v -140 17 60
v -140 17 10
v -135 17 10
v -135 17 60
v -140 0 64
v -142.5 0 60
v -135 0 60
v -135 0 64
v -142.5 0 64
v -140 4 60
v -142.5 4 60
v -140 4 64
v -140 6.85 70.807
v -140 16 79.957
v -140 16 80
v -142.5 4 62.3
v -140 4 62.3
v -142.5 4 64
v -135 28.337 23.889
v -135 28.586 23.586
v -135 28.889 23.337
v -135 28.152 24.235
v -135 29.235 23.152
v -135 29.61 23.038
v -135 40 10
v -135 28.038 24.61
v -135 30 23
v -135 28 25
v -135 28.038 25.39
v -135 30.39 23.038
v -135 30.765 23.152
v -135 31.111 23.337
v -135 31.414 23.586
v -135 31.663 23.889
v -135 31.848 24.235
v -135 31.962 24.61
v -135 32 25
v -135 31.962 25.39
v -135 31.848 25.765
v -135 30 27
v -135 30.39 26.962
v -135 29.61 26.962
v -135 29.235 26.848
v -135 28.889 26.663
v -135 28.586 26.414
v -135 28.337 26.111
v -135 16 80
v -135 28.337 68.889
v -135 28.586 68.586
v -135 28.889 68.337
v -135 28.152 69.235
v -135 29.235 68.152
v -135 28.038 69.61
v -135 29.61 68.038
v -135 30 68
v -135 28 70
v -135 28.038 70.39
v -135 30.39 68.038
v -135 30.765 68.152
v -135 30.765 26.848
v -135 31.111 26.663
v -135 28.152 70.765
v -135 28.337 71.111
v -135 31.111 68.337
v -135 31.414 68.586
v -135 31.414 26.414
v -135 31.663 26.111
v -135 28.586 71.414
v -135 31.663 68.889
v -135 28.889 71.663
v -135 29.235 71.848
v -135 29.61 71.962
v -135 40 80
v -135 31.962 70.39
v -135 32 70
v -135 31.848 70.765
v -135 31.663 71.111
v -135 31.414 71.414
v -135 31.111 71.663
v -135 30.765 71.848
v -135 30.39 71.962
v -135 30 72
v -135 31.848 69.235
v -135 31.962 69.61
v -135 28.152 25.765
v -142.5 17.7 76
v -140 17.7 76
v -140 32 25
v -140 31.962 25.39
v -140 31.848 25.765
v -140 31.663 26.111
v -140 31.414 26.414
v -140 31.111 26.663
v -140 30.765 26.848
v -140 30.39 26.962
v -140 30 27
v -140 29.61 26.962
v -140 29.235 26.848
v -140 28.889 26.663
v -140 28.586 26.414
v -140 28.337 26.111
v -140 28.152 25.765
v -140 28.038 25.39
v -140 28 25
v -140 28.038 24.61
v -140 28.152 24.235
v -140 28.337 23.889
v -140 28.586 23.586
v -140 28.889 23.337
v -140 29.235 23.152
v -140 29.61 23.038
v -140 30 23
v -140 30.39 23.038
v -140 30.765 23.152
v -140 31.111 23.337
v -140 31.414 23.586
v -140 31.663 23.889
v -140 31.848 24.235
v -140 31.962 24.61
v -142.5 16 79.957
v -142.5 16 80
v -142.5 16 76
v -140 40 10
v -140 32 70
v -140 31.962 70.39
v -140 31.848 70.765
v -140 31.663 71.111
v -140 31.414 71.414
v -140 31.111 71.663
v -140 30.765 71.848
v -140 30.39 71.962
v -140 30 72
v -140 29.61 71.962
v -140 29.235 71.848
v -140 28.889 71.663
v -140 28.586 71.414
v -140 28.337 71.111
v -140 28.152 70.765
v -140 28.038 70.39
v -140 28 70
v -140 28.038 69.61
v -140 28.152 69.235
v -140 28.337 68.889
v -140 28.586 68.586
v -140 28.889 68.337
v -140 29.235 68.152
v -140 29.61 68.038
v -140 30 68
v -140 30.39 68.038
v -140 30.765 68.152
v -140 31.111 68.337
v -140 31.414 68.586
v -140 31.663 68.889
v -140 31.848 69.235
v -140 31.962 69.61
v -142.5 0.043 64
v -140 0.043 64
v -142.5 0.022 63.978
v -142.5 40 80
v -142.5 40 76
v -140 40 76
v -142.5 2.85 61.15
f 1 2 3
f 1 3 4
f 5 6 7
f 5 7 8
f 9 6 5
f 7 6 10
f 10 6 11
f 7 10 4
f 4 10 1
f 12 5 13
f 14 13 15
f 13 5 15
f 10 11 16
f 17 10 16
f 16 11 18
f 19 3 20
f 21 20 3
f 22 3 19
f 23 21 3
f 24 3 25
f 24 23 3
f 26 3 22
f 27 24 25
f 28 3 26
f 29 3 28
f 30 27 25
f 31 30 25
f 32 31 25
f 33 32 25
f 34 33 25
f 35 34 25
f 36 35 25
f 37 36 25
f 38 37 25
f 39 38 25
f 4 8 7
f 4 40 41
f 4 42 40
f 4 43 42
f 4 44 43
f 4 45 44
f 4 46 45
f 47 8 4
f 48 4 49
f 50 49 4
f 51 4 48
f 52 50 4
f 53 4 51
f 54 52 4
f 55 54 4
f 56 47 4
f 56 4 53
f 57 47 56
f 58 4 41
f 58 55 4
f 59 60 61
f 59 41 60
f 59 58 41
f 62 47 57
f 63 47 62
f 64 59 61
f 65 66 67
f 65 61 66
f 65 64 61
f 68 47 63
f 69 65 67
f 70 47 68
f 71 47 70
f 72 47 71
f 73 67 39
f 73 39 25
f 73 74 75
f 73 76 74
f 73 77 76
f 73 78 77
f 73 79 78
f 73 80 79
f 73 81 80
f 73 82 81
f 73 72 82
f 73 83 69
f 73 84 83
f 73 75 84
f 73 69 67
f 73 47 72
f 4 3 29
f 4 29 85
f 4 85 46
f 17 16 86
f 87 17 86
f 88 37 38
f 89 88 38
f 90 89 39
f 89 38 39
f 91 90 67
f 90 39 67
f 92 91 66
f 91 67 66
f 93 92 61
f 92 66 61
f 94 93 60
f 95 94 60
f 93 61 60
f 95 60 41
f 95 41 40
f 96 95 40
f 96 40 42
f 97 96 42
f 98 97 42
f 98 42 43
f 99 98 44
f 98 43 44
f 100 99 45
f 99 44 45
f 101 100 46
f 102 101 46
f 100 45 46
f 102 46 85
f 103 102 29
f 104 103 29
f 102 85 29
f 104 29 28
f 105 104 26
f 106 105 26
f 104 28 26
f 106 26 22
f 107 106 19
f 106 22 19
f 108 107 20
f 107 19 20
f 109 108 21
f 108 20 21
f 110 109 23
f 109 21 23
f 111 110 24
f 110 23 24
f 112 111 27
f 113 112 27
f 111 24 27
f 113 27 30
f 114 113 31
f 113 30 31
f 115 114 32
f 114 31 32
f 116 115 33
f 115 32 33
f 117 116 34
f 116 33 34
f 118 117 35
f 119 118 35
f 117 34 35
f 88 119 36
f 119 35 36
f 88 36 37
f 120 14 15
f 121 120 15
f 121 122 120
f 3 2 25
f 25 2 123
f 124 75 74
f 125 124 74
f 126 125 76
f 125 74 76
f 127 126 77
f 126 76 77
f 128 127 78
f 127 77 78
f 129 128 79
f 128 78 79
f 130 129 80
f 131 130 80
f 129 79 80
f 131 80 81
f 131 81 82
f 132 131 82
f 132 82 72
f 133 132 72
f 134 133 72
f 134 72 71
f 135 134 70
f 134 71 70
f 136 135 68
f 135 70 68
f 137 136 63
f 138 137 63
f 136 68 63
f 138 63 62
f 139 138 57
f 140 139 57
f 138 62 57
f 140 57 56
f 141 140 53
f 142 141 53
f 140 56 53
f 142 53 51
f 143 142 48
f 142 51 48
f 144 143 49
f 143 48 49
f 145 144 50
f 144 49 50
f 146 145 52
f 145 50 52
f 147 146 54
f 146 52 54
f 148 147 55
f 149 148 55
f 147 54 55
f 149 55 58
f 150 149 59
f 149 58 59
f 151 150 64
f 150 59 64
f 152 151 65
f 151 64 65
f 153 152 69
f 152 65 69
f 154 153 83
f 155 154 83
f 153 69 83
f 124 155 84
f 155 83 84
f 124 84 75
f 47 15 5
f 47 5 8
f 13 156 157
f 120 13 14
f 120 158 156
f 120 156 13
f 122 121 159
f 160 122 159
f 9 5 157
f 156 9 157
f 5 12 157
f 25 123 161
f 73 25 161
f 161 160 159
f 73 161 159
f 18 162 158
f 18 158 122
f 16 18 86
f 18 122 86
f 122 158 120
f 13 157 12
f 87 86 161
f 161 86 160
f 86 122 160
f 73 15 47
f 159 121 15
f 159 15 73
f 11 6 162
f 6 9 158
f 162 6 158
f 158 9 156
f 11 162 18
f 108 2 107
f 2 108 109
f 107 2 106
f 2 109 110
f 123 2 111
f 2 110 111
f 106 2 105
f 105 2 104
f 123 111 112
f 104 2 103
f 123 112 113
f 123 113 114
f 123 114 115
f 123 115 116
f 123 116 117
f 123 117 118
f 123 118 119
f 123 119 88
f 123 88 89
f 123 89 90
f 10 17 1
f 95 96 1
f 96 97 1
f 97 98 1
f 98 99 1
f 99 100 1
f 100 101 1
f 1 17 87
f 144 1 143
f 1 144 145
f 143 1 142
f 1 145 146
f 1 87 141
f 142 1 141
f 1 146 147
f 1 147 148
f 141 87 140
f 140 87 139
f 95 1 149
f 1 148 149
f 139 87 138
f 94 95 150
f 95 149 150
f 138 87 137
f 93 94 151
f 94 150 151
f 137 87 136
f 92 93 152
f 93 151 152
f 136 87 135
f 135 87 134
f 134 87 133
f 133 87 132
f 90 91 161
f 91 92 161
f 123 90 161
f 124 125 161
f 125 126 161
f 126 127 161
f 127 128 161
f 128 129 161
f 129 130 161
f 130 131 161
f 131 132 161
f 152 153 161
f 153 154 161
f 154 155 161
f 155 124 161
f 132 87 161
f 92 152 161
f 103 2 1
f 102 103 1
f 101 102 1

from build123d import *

# Parameters (mm, degrees)
CIRCLE003_R                                  = 2
EXTRUDE087_DEPTH                             = 5
CIRCLE004_R                                  = 2
EXTRUDE088_DEPTH                             = 5
RECTANGLE026_W                               = 23
RECTANGLE026_H                               = 20
EXTRUDE019_DEPTH                             = 5
CHAMFER006_SIZE                              = 16
RECTANGLE028_AS_DRAWN_W                      = 22.6
RECTANGLE028_AS_DRAWN_H                      = 4
EXTRUDE033_DEPTH                             = 2.5
EXTRUDE033_ONTO_RECTANGLE028_ROLL_ANGLE      = 89.999906
EXTRUDE033_ONTO_RECTANGLE028_PITCH_ANGLE     = -44.999767
EXTRUDE033_ONTO_RECTANGLE028_PLACEMENT_ANGLE = 89.999906
RECTANGLE029_W                               = 24
RECTANGLE029_H                               = 4
EXTRUDE034_DEPTH                             = 2.5
RECTANGLE030_W                               = 4
RECTANGLE030_H                               = 4
EXTRUDE035_DEPTH                             = 2.5
RECTANGLE027_W                               = 17
RECTANGLE027_H                               = 20
EXTRUDE020_DEPTH                             = 5
RECTANGLE025_W                               = 23
RECTANGLE025_H                               = 60
EXTRUDE018_DEPTH                             = 5


with BuildPart() as extrude087:
    # Circle003 → Extrude087 (new body)
    with BuildSketch(Plane(origin=(-135, 30, 25), x_dir=(0, 1, 0), z_dir=(1, 0, 0))):
        Circle(CIRCLE003_R)
    extrude(amount=-EXTRUDE087_DEPTH)


with BuildPart() as extrude088:
    # Circle004 → Extrude088 (new body)
    with BuildSketch(Plane(origin=(-135, 30, 70), x_dir=(0, 1, 0), z_dir=(1, 0, 0))):
        Circle(CIRCLE004_R)
    extrude(amount=-EXTRUDE088_DEPTH)


with BuildPart() as chamfer006:
    # Rectangle026 → Extrude019 (new body)
    with BuildSketch(Plane(origin=(0, 17, 70), x_dir=(0, 1, 0), z_dir=(1, 0, 0))):
        with Locations((11.5, 10)):
            Rectangle(RECTANGLE026_W, RECTANGLE026_H)
    extrude(amount=EXTRUDE019_DEPTH)


with BuildPart() as chamfer006_1:
    # Extrude019 placement: moved
    add(chamfer006.part.moved(Location((0, -17, 0))))

    # Chamfer006
    chamfer006_edges = [chamfer006_1.edges().sort_by_distance(p)[0] for p in [
        (2.5, 0, 90),
    ]]
    chamfer(chamfer006_edges, length=CHAMFER006_SIZE)


with BuildPart() as chamfer006_2:
    # Chamfer006 placement: moved
    add(chamfer006_1.part.moved(Location((-140, 0, 0))))


with BuildPart() as extrude033:
    # Rectangle028 as drawn → Extrude033 (new)
    with BuildSketch(Plane.XY):
        with Locations((11.3, 2)):
            Rectangle(RECTANGLE028_AS_DRAWN_W, RECTANGLE028_AS_DRAWN_H)
    extrude(amount=EXTRUDE033_DEPTH)


with BuildPart() as extrude033_1:
    # Extrude033 onto Rectangle028 roll: moved
    add(extrude033.part.rotate(Axis((0, 0, 0), (1, 0, 0)), EXTRUDE033_ONTO_RECTANGLE028_ROLL_ANGLE))


with BuildPart() as extrude033_2:
    # Extrude033 onto Rectangle028 pitch: moved
    add(extrude033_1.part.rotate(Axis((0, 0, 0), (0, 1, 0)), EXTRUDE033_ONTO_RECTANGLE028_PITCH_ANGLE))


with BuildPart() as extrude033_3:
    # Extrude033 onto Rectangle028 placement: moved
    add(extrude033_2.part.moved(Location((5, 2.85, 71.15))).rotate(Axis((5, 2.85, 71.15), (0, 0, 1)), EXTRUDE033_ONTO_RECTANGLE028_PLACEMENT_ANGLE))


with BuildPart() as extrude033_4:
    # Extrude033 placement: moved
    add(extrude033_3.part.moved(Location((-147.5, 0, 0))))


with BuildPart() as extrude034:
    # Rectangle029 → Extrude034 (new body)
    with BuildSketch(Plane(origin=(5, 16, 86), x_dir=(0, 1, 0), z_dir=(1, 0, 0))):
        with Locations((12, 2)):
            Rectangle(RECTANGLE029_W, RECTANGLE029_H)
    extrude(amount=EXTRUDE034_DEPTH)


with BuildPart() as extrude034_1:
    # Extrude034 placement: moved
    add(extrude034.part.moved(Location((-147.5, 0, 0))))


with BuildPart() as extrude035:
    # Rectangle030 → Extrude035 (new body)
    with BuildSketch(Plane(origin=(5, 0, 70), x_dir=(0, 1, 0), z_dir=(1, 0, 0))):
        with Locations((2, 2)):
            Rectangle(RECTANGLE030_W, RECTANGLE030_H)
    extrude(amount=EXTRUDE035_DEPTH)


with BuildPart() as extrude035_1:
    # Extrude035 placement: moved
    add(extrude035.part.moved(Location((-147.5, 0, 0))))


with BuildPart() as fusion:
    # Rectangle027 → Extrude020 (new body)
    with BuildSketch(Plane(origin=(0, 0, 70), x_dir=(0, 1, 0), z_dir=(1, 0, 0))):
        with Locations((8.5, 10)):
            Rectangle(RECTANGLE027_W, RECTANGLE027_H)
    extrude(amount=EXTRUDE020_DEPTH)


with BuildPart() as fusion_1:
    # Extrude020 placement: moved
    add(fusion.part.moved(Location((-140, 23, 0))))

    # Fusion: union Chamfer006, Extrude033, Extrude034, Extrude035
    add(chamfer006_2.part)
    add(extrude033_4.part)
    add(extrude034_1.part)
    add(extrude035_1.part)


with BuildPart() as fusion_2:
    # Fusion placement: moved
    add(fusion_1.part.moved(Location((0, 0, -10))))


with BuildPart() as cut008:
    # Rectangle025 → Extrude018 (new body)
    with BuildSketch(Plane(origin=(0, 17, 10), x_dir=(0, 1, 0), z_dir=(1, 0, 0))):
        with Locations((11.5, 30)):
            Rectangle(RECTANGLE025_W, RECTANGLE025_H)
    extrude(amount=EXTRUDE018_DEPTH)


with BuildPart() as cut008_1:
    # Extrude018 placement: moved
    add(cut008.part.moved(Location((-140, 0, 0))))

    # Fusion002: union Fusion
    add(fusion_2.part)

    # Cut006: cut Extrude088
    add(extrude088.part, mode=Mode.SUBTRACT)

    # Cut008: cut Extrude087
    add(extrude087.part, mode=Mode.SUBTRACT)


solid = cut008_1.part
